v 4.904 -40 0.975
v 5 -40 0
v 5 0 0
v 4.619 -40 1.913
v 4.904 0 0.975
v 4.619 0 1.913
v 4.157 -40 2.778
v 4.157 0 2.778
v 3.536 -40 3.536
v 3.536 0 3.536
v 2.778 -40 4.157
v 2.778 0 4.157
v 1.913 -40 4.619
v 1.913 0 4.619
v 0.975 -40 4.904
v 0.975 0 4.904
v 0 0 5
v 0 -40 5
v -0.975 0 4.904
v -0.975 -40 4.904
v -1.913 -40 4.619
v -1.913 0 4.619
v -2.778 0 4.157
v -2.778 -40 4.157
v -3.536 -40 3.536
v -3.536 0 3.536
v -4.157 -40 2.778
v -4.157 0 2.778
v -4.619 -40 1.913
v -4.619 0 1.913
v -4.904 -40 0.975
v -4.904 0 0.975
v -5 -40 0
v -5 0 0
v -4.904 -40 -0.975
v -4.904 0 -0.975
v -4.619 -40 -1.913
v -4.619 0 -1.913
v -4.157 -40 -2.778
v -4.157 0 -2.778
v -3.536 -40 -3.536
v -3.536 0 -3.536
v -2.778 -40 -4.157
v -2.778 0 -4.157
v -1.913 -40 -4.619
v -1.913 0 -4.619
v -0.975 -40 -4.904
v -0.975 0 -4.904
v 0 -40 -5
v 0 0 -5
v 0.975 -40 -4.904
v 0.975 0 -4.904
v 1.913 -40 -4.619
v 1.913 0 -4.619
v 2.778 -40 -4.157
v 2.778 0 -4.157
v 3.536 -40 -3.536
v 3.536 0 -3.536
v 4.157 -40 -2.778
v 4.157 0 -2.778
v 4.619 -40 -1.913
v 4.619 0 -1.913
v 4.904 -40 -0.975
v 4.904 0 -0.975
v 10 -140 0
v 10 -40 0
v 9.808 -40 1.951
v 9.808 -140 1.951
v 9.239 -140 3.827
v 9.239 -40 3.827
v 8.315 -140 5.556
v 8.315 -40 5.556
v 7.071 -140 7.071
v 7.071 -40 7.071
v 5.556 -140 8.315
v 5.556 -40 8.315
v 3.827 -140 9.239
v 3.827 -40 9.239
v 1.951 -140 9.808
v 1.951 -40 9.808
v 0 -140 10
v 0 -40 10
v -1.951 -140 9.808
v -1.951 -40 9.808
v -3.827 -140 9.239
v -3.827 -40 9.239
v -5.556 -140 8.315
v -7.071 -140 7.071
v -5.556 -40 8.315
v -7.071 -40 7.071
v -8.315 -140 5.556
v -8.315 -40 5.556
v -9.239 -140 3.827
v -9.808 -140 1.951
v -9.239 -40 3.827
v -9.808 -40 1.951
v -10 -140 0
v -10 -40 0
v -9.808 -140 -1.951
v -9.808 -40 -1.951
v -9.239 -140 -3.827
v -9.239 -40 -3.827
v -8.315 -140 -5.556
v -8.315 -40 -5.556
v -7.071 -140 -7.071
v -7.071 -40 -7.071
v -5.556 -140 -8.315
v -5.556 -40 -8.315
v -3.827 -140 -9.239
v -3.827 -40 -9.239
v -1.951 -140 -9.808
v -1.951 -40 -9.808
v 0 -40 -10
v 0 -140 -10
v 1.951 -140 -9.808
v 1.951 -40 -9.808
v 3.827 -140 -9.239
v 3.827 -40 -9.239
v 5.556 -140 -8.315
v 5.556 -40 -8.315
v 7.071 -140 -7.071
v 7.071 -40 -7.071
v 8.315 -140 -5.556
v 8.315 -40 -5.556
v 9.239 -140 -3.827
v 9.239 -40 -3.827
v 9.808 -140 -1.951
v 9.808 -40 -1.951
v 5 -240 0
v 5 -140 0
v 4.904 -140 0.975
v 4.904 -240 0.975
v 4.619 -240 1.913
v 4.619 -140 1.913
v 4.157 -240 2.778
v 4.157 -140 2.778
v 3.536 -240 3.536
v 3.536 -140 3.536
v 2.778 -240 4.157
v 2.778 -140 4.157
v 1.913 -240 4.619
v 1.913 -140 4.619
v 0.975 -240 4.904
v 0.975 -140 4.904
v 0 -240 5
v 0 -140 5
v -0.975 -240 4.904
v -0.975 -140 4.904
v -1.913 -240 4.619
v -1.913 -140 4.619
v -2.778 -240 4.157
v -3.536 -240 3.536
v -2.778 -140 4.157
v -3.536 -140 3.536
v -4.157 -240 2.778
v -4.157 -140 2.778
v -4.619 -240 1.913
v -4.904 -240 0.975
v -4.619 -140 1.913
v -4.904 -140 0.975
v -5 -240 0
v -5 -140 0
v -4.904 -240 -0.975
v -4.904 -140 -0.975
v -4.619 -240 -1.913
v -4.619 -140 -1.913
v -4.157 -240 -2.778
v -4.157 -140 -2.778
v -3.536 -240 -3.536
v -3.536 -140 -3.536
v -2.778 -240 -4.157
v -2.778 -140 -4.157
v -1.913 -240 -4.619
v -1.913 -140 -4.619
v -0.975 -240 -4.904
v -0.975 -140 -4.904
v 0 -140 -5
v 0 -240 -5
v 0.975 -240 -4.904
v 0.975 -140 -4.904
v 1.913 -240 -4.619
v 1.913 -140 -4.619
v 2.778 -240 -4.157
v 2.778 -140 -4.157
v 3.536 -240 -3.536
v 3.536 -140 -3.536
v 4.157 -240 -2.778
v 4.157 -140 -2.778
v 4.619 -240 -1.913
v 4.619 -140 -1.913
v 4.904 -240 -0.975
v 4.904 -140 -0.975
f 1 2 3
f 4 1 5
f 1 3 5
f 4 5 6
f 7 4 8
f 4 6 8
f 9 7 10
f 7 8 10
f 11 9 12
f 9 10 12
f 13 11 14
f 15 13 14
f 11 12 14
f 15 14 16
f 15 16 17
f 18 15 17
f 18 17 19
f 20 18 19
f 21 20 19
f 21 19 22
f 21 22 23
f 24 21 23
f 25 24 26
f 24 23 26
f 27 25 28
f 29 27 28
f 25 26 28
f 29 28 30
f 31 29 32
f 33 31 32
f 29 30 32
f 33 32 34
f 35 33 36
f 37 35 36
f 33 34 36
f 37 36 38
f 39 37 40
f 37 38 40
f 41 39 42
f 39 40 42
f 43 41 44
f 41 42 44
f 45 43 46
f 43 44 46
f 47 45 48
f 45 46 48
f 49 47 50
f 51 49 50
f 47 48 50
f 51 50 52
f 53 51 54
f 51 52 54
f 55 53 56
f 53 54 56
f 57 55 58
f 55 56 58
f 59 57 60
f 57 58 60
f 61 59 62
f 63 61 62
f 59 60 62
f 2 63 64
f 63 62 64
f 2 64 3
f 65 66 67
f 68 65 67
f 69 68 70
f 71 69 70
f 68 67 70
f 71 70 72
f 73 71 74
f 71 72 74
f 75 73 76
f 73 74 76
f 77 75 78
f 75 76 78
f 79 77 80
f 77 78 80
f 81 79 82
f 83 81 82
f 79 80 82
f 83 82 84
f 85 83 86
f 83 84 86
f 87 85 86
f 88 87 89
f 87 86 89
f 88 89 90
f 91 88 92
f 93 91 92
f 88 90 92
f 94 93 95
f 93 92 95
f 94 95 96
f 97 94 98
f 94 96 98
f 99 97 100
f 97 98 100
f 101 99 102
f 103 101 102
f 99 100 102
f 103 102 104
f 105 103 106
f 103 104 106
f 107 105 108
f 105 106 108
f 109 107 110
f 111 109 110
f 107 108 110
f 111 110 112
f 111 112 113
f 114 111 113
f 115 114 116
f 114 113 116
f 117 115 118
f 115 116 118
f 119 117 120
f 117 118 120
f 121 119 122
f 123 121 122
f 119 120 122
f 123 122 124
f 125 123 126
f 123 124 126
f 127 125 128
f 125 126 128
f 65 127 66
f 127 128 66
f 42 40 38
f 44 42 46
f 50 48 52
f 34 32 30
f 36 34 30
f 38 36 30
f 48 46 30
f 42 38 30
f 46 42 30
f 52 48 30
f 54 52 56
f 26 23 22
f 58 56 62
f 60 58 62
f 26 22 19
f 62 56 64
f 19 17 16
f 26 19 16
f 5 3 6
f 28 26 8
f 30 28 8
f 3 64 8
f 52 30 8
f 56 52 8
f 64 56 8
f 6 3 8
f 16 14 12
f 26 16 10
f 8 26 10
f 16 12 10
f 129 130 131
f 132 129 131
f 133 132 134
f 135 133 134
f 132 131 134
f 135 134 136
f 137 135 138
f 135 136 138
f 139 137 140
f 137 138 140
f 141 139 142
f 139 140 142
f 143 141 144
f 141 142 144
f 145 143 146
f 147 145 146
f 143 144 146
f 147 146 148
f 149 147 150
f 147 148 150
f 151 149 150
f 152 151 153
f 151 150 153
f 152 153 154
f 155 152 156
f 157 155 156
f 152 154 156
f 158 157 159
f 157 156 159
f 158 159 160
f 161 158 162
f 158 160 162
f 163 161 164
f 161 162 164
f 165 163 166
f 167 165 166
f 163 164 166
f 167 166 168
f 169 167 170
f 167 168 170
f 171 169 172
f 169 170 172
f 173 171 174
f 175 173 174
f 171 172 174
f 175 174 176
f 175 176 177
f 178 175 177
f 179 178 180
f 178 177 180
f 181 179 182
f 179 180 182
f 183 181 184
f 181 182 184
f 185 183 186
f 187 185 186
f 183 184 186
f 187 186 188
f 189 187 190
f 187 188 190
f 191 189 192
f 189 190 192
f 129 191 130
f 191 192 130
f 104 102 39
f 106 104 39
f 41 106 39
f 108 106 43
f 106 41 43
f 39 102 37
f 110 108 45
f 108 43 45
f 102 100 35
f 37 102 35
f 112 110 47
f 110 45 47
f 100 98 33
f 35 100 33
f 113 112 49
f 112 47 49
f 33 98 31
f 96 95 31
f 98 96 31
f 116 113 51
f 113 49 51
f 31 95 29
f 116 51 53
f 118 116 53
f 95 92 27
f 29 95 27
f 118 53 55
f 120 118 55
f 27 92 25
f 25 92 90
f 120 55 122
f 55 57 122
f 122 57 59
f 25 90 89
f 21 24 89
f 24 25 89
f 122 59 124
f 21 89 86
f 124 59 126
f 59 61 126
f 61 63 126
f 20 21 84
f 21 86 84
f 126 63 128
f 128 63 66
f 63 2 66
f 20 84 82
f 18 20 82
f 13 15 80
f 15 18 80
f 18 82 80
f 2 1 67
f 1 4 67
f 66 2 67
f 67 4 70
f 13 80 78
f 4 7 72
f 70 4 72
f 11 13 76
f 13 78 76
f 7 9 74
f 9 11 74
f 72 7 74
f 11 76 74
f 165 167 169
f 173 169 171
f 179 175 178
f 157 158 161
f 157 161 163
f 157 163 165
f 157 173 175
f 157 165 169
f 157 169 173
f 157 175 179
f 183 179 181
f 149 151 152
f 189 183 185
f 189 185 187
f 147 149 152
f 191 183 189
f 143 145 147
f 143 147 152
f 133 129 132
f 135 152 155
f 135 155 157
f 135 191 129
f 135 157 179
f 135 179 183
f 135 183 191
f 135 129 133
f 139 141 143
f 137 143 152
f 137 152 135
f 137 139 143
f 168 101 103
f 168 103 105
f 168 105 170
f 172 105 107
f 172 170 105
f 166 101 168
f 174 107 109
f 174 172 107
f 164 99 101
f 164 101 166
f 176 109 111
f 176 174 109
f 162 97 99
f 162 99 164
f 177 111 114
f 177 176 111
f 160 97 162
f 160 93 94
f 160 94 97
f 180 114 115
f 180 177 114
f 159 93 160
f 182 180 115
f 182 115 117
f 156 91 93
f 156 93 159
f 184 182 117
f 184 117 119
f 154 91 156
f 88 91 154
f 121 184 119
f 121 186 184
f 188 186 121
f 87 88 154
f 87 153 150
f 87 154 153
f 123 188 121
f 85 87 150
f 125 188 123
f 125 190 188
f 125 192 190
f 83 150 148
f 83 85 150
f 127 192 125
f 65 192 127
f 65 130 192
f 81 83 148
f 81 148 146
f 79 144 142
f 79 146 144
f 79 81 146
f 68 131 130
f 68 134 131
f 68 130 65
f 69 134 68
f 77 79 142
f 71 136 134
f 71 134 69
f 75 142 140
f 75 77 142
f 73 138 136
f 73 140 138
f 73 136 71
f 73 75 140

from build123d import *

# Parameters (mm, degrees)
F0_R     = 5
F1_DEPTH = 40
F2_R     = 5
F4_DEPTH = 200
F3_R     = 10
F3_R_2   = 5
F5_DEPTH = 100


with BuildPart() as f1:
    # F0 (on Front) → F1 (new body)
    with BuildSketch(Plane.XZ):
        Circle(F0_R)
    extrude(amount=F1_DEPTH)

    # F2 (on face) → F4 (join)
    with BuildSketch(Plane.XZ.offset(40)):
        Circle(F2_R)
    extrude(amount=F4_DEPTH)

    # F3 (on face) → F5 (join)
    with BuildSketch(Plane.XZ.offset(40)):
        Circle(F3_R)
        Circle(F3_R_2, mode=Mode.SUBTRACT)
    extrude(amount=F5_DEPTH)


solid = f1.part
